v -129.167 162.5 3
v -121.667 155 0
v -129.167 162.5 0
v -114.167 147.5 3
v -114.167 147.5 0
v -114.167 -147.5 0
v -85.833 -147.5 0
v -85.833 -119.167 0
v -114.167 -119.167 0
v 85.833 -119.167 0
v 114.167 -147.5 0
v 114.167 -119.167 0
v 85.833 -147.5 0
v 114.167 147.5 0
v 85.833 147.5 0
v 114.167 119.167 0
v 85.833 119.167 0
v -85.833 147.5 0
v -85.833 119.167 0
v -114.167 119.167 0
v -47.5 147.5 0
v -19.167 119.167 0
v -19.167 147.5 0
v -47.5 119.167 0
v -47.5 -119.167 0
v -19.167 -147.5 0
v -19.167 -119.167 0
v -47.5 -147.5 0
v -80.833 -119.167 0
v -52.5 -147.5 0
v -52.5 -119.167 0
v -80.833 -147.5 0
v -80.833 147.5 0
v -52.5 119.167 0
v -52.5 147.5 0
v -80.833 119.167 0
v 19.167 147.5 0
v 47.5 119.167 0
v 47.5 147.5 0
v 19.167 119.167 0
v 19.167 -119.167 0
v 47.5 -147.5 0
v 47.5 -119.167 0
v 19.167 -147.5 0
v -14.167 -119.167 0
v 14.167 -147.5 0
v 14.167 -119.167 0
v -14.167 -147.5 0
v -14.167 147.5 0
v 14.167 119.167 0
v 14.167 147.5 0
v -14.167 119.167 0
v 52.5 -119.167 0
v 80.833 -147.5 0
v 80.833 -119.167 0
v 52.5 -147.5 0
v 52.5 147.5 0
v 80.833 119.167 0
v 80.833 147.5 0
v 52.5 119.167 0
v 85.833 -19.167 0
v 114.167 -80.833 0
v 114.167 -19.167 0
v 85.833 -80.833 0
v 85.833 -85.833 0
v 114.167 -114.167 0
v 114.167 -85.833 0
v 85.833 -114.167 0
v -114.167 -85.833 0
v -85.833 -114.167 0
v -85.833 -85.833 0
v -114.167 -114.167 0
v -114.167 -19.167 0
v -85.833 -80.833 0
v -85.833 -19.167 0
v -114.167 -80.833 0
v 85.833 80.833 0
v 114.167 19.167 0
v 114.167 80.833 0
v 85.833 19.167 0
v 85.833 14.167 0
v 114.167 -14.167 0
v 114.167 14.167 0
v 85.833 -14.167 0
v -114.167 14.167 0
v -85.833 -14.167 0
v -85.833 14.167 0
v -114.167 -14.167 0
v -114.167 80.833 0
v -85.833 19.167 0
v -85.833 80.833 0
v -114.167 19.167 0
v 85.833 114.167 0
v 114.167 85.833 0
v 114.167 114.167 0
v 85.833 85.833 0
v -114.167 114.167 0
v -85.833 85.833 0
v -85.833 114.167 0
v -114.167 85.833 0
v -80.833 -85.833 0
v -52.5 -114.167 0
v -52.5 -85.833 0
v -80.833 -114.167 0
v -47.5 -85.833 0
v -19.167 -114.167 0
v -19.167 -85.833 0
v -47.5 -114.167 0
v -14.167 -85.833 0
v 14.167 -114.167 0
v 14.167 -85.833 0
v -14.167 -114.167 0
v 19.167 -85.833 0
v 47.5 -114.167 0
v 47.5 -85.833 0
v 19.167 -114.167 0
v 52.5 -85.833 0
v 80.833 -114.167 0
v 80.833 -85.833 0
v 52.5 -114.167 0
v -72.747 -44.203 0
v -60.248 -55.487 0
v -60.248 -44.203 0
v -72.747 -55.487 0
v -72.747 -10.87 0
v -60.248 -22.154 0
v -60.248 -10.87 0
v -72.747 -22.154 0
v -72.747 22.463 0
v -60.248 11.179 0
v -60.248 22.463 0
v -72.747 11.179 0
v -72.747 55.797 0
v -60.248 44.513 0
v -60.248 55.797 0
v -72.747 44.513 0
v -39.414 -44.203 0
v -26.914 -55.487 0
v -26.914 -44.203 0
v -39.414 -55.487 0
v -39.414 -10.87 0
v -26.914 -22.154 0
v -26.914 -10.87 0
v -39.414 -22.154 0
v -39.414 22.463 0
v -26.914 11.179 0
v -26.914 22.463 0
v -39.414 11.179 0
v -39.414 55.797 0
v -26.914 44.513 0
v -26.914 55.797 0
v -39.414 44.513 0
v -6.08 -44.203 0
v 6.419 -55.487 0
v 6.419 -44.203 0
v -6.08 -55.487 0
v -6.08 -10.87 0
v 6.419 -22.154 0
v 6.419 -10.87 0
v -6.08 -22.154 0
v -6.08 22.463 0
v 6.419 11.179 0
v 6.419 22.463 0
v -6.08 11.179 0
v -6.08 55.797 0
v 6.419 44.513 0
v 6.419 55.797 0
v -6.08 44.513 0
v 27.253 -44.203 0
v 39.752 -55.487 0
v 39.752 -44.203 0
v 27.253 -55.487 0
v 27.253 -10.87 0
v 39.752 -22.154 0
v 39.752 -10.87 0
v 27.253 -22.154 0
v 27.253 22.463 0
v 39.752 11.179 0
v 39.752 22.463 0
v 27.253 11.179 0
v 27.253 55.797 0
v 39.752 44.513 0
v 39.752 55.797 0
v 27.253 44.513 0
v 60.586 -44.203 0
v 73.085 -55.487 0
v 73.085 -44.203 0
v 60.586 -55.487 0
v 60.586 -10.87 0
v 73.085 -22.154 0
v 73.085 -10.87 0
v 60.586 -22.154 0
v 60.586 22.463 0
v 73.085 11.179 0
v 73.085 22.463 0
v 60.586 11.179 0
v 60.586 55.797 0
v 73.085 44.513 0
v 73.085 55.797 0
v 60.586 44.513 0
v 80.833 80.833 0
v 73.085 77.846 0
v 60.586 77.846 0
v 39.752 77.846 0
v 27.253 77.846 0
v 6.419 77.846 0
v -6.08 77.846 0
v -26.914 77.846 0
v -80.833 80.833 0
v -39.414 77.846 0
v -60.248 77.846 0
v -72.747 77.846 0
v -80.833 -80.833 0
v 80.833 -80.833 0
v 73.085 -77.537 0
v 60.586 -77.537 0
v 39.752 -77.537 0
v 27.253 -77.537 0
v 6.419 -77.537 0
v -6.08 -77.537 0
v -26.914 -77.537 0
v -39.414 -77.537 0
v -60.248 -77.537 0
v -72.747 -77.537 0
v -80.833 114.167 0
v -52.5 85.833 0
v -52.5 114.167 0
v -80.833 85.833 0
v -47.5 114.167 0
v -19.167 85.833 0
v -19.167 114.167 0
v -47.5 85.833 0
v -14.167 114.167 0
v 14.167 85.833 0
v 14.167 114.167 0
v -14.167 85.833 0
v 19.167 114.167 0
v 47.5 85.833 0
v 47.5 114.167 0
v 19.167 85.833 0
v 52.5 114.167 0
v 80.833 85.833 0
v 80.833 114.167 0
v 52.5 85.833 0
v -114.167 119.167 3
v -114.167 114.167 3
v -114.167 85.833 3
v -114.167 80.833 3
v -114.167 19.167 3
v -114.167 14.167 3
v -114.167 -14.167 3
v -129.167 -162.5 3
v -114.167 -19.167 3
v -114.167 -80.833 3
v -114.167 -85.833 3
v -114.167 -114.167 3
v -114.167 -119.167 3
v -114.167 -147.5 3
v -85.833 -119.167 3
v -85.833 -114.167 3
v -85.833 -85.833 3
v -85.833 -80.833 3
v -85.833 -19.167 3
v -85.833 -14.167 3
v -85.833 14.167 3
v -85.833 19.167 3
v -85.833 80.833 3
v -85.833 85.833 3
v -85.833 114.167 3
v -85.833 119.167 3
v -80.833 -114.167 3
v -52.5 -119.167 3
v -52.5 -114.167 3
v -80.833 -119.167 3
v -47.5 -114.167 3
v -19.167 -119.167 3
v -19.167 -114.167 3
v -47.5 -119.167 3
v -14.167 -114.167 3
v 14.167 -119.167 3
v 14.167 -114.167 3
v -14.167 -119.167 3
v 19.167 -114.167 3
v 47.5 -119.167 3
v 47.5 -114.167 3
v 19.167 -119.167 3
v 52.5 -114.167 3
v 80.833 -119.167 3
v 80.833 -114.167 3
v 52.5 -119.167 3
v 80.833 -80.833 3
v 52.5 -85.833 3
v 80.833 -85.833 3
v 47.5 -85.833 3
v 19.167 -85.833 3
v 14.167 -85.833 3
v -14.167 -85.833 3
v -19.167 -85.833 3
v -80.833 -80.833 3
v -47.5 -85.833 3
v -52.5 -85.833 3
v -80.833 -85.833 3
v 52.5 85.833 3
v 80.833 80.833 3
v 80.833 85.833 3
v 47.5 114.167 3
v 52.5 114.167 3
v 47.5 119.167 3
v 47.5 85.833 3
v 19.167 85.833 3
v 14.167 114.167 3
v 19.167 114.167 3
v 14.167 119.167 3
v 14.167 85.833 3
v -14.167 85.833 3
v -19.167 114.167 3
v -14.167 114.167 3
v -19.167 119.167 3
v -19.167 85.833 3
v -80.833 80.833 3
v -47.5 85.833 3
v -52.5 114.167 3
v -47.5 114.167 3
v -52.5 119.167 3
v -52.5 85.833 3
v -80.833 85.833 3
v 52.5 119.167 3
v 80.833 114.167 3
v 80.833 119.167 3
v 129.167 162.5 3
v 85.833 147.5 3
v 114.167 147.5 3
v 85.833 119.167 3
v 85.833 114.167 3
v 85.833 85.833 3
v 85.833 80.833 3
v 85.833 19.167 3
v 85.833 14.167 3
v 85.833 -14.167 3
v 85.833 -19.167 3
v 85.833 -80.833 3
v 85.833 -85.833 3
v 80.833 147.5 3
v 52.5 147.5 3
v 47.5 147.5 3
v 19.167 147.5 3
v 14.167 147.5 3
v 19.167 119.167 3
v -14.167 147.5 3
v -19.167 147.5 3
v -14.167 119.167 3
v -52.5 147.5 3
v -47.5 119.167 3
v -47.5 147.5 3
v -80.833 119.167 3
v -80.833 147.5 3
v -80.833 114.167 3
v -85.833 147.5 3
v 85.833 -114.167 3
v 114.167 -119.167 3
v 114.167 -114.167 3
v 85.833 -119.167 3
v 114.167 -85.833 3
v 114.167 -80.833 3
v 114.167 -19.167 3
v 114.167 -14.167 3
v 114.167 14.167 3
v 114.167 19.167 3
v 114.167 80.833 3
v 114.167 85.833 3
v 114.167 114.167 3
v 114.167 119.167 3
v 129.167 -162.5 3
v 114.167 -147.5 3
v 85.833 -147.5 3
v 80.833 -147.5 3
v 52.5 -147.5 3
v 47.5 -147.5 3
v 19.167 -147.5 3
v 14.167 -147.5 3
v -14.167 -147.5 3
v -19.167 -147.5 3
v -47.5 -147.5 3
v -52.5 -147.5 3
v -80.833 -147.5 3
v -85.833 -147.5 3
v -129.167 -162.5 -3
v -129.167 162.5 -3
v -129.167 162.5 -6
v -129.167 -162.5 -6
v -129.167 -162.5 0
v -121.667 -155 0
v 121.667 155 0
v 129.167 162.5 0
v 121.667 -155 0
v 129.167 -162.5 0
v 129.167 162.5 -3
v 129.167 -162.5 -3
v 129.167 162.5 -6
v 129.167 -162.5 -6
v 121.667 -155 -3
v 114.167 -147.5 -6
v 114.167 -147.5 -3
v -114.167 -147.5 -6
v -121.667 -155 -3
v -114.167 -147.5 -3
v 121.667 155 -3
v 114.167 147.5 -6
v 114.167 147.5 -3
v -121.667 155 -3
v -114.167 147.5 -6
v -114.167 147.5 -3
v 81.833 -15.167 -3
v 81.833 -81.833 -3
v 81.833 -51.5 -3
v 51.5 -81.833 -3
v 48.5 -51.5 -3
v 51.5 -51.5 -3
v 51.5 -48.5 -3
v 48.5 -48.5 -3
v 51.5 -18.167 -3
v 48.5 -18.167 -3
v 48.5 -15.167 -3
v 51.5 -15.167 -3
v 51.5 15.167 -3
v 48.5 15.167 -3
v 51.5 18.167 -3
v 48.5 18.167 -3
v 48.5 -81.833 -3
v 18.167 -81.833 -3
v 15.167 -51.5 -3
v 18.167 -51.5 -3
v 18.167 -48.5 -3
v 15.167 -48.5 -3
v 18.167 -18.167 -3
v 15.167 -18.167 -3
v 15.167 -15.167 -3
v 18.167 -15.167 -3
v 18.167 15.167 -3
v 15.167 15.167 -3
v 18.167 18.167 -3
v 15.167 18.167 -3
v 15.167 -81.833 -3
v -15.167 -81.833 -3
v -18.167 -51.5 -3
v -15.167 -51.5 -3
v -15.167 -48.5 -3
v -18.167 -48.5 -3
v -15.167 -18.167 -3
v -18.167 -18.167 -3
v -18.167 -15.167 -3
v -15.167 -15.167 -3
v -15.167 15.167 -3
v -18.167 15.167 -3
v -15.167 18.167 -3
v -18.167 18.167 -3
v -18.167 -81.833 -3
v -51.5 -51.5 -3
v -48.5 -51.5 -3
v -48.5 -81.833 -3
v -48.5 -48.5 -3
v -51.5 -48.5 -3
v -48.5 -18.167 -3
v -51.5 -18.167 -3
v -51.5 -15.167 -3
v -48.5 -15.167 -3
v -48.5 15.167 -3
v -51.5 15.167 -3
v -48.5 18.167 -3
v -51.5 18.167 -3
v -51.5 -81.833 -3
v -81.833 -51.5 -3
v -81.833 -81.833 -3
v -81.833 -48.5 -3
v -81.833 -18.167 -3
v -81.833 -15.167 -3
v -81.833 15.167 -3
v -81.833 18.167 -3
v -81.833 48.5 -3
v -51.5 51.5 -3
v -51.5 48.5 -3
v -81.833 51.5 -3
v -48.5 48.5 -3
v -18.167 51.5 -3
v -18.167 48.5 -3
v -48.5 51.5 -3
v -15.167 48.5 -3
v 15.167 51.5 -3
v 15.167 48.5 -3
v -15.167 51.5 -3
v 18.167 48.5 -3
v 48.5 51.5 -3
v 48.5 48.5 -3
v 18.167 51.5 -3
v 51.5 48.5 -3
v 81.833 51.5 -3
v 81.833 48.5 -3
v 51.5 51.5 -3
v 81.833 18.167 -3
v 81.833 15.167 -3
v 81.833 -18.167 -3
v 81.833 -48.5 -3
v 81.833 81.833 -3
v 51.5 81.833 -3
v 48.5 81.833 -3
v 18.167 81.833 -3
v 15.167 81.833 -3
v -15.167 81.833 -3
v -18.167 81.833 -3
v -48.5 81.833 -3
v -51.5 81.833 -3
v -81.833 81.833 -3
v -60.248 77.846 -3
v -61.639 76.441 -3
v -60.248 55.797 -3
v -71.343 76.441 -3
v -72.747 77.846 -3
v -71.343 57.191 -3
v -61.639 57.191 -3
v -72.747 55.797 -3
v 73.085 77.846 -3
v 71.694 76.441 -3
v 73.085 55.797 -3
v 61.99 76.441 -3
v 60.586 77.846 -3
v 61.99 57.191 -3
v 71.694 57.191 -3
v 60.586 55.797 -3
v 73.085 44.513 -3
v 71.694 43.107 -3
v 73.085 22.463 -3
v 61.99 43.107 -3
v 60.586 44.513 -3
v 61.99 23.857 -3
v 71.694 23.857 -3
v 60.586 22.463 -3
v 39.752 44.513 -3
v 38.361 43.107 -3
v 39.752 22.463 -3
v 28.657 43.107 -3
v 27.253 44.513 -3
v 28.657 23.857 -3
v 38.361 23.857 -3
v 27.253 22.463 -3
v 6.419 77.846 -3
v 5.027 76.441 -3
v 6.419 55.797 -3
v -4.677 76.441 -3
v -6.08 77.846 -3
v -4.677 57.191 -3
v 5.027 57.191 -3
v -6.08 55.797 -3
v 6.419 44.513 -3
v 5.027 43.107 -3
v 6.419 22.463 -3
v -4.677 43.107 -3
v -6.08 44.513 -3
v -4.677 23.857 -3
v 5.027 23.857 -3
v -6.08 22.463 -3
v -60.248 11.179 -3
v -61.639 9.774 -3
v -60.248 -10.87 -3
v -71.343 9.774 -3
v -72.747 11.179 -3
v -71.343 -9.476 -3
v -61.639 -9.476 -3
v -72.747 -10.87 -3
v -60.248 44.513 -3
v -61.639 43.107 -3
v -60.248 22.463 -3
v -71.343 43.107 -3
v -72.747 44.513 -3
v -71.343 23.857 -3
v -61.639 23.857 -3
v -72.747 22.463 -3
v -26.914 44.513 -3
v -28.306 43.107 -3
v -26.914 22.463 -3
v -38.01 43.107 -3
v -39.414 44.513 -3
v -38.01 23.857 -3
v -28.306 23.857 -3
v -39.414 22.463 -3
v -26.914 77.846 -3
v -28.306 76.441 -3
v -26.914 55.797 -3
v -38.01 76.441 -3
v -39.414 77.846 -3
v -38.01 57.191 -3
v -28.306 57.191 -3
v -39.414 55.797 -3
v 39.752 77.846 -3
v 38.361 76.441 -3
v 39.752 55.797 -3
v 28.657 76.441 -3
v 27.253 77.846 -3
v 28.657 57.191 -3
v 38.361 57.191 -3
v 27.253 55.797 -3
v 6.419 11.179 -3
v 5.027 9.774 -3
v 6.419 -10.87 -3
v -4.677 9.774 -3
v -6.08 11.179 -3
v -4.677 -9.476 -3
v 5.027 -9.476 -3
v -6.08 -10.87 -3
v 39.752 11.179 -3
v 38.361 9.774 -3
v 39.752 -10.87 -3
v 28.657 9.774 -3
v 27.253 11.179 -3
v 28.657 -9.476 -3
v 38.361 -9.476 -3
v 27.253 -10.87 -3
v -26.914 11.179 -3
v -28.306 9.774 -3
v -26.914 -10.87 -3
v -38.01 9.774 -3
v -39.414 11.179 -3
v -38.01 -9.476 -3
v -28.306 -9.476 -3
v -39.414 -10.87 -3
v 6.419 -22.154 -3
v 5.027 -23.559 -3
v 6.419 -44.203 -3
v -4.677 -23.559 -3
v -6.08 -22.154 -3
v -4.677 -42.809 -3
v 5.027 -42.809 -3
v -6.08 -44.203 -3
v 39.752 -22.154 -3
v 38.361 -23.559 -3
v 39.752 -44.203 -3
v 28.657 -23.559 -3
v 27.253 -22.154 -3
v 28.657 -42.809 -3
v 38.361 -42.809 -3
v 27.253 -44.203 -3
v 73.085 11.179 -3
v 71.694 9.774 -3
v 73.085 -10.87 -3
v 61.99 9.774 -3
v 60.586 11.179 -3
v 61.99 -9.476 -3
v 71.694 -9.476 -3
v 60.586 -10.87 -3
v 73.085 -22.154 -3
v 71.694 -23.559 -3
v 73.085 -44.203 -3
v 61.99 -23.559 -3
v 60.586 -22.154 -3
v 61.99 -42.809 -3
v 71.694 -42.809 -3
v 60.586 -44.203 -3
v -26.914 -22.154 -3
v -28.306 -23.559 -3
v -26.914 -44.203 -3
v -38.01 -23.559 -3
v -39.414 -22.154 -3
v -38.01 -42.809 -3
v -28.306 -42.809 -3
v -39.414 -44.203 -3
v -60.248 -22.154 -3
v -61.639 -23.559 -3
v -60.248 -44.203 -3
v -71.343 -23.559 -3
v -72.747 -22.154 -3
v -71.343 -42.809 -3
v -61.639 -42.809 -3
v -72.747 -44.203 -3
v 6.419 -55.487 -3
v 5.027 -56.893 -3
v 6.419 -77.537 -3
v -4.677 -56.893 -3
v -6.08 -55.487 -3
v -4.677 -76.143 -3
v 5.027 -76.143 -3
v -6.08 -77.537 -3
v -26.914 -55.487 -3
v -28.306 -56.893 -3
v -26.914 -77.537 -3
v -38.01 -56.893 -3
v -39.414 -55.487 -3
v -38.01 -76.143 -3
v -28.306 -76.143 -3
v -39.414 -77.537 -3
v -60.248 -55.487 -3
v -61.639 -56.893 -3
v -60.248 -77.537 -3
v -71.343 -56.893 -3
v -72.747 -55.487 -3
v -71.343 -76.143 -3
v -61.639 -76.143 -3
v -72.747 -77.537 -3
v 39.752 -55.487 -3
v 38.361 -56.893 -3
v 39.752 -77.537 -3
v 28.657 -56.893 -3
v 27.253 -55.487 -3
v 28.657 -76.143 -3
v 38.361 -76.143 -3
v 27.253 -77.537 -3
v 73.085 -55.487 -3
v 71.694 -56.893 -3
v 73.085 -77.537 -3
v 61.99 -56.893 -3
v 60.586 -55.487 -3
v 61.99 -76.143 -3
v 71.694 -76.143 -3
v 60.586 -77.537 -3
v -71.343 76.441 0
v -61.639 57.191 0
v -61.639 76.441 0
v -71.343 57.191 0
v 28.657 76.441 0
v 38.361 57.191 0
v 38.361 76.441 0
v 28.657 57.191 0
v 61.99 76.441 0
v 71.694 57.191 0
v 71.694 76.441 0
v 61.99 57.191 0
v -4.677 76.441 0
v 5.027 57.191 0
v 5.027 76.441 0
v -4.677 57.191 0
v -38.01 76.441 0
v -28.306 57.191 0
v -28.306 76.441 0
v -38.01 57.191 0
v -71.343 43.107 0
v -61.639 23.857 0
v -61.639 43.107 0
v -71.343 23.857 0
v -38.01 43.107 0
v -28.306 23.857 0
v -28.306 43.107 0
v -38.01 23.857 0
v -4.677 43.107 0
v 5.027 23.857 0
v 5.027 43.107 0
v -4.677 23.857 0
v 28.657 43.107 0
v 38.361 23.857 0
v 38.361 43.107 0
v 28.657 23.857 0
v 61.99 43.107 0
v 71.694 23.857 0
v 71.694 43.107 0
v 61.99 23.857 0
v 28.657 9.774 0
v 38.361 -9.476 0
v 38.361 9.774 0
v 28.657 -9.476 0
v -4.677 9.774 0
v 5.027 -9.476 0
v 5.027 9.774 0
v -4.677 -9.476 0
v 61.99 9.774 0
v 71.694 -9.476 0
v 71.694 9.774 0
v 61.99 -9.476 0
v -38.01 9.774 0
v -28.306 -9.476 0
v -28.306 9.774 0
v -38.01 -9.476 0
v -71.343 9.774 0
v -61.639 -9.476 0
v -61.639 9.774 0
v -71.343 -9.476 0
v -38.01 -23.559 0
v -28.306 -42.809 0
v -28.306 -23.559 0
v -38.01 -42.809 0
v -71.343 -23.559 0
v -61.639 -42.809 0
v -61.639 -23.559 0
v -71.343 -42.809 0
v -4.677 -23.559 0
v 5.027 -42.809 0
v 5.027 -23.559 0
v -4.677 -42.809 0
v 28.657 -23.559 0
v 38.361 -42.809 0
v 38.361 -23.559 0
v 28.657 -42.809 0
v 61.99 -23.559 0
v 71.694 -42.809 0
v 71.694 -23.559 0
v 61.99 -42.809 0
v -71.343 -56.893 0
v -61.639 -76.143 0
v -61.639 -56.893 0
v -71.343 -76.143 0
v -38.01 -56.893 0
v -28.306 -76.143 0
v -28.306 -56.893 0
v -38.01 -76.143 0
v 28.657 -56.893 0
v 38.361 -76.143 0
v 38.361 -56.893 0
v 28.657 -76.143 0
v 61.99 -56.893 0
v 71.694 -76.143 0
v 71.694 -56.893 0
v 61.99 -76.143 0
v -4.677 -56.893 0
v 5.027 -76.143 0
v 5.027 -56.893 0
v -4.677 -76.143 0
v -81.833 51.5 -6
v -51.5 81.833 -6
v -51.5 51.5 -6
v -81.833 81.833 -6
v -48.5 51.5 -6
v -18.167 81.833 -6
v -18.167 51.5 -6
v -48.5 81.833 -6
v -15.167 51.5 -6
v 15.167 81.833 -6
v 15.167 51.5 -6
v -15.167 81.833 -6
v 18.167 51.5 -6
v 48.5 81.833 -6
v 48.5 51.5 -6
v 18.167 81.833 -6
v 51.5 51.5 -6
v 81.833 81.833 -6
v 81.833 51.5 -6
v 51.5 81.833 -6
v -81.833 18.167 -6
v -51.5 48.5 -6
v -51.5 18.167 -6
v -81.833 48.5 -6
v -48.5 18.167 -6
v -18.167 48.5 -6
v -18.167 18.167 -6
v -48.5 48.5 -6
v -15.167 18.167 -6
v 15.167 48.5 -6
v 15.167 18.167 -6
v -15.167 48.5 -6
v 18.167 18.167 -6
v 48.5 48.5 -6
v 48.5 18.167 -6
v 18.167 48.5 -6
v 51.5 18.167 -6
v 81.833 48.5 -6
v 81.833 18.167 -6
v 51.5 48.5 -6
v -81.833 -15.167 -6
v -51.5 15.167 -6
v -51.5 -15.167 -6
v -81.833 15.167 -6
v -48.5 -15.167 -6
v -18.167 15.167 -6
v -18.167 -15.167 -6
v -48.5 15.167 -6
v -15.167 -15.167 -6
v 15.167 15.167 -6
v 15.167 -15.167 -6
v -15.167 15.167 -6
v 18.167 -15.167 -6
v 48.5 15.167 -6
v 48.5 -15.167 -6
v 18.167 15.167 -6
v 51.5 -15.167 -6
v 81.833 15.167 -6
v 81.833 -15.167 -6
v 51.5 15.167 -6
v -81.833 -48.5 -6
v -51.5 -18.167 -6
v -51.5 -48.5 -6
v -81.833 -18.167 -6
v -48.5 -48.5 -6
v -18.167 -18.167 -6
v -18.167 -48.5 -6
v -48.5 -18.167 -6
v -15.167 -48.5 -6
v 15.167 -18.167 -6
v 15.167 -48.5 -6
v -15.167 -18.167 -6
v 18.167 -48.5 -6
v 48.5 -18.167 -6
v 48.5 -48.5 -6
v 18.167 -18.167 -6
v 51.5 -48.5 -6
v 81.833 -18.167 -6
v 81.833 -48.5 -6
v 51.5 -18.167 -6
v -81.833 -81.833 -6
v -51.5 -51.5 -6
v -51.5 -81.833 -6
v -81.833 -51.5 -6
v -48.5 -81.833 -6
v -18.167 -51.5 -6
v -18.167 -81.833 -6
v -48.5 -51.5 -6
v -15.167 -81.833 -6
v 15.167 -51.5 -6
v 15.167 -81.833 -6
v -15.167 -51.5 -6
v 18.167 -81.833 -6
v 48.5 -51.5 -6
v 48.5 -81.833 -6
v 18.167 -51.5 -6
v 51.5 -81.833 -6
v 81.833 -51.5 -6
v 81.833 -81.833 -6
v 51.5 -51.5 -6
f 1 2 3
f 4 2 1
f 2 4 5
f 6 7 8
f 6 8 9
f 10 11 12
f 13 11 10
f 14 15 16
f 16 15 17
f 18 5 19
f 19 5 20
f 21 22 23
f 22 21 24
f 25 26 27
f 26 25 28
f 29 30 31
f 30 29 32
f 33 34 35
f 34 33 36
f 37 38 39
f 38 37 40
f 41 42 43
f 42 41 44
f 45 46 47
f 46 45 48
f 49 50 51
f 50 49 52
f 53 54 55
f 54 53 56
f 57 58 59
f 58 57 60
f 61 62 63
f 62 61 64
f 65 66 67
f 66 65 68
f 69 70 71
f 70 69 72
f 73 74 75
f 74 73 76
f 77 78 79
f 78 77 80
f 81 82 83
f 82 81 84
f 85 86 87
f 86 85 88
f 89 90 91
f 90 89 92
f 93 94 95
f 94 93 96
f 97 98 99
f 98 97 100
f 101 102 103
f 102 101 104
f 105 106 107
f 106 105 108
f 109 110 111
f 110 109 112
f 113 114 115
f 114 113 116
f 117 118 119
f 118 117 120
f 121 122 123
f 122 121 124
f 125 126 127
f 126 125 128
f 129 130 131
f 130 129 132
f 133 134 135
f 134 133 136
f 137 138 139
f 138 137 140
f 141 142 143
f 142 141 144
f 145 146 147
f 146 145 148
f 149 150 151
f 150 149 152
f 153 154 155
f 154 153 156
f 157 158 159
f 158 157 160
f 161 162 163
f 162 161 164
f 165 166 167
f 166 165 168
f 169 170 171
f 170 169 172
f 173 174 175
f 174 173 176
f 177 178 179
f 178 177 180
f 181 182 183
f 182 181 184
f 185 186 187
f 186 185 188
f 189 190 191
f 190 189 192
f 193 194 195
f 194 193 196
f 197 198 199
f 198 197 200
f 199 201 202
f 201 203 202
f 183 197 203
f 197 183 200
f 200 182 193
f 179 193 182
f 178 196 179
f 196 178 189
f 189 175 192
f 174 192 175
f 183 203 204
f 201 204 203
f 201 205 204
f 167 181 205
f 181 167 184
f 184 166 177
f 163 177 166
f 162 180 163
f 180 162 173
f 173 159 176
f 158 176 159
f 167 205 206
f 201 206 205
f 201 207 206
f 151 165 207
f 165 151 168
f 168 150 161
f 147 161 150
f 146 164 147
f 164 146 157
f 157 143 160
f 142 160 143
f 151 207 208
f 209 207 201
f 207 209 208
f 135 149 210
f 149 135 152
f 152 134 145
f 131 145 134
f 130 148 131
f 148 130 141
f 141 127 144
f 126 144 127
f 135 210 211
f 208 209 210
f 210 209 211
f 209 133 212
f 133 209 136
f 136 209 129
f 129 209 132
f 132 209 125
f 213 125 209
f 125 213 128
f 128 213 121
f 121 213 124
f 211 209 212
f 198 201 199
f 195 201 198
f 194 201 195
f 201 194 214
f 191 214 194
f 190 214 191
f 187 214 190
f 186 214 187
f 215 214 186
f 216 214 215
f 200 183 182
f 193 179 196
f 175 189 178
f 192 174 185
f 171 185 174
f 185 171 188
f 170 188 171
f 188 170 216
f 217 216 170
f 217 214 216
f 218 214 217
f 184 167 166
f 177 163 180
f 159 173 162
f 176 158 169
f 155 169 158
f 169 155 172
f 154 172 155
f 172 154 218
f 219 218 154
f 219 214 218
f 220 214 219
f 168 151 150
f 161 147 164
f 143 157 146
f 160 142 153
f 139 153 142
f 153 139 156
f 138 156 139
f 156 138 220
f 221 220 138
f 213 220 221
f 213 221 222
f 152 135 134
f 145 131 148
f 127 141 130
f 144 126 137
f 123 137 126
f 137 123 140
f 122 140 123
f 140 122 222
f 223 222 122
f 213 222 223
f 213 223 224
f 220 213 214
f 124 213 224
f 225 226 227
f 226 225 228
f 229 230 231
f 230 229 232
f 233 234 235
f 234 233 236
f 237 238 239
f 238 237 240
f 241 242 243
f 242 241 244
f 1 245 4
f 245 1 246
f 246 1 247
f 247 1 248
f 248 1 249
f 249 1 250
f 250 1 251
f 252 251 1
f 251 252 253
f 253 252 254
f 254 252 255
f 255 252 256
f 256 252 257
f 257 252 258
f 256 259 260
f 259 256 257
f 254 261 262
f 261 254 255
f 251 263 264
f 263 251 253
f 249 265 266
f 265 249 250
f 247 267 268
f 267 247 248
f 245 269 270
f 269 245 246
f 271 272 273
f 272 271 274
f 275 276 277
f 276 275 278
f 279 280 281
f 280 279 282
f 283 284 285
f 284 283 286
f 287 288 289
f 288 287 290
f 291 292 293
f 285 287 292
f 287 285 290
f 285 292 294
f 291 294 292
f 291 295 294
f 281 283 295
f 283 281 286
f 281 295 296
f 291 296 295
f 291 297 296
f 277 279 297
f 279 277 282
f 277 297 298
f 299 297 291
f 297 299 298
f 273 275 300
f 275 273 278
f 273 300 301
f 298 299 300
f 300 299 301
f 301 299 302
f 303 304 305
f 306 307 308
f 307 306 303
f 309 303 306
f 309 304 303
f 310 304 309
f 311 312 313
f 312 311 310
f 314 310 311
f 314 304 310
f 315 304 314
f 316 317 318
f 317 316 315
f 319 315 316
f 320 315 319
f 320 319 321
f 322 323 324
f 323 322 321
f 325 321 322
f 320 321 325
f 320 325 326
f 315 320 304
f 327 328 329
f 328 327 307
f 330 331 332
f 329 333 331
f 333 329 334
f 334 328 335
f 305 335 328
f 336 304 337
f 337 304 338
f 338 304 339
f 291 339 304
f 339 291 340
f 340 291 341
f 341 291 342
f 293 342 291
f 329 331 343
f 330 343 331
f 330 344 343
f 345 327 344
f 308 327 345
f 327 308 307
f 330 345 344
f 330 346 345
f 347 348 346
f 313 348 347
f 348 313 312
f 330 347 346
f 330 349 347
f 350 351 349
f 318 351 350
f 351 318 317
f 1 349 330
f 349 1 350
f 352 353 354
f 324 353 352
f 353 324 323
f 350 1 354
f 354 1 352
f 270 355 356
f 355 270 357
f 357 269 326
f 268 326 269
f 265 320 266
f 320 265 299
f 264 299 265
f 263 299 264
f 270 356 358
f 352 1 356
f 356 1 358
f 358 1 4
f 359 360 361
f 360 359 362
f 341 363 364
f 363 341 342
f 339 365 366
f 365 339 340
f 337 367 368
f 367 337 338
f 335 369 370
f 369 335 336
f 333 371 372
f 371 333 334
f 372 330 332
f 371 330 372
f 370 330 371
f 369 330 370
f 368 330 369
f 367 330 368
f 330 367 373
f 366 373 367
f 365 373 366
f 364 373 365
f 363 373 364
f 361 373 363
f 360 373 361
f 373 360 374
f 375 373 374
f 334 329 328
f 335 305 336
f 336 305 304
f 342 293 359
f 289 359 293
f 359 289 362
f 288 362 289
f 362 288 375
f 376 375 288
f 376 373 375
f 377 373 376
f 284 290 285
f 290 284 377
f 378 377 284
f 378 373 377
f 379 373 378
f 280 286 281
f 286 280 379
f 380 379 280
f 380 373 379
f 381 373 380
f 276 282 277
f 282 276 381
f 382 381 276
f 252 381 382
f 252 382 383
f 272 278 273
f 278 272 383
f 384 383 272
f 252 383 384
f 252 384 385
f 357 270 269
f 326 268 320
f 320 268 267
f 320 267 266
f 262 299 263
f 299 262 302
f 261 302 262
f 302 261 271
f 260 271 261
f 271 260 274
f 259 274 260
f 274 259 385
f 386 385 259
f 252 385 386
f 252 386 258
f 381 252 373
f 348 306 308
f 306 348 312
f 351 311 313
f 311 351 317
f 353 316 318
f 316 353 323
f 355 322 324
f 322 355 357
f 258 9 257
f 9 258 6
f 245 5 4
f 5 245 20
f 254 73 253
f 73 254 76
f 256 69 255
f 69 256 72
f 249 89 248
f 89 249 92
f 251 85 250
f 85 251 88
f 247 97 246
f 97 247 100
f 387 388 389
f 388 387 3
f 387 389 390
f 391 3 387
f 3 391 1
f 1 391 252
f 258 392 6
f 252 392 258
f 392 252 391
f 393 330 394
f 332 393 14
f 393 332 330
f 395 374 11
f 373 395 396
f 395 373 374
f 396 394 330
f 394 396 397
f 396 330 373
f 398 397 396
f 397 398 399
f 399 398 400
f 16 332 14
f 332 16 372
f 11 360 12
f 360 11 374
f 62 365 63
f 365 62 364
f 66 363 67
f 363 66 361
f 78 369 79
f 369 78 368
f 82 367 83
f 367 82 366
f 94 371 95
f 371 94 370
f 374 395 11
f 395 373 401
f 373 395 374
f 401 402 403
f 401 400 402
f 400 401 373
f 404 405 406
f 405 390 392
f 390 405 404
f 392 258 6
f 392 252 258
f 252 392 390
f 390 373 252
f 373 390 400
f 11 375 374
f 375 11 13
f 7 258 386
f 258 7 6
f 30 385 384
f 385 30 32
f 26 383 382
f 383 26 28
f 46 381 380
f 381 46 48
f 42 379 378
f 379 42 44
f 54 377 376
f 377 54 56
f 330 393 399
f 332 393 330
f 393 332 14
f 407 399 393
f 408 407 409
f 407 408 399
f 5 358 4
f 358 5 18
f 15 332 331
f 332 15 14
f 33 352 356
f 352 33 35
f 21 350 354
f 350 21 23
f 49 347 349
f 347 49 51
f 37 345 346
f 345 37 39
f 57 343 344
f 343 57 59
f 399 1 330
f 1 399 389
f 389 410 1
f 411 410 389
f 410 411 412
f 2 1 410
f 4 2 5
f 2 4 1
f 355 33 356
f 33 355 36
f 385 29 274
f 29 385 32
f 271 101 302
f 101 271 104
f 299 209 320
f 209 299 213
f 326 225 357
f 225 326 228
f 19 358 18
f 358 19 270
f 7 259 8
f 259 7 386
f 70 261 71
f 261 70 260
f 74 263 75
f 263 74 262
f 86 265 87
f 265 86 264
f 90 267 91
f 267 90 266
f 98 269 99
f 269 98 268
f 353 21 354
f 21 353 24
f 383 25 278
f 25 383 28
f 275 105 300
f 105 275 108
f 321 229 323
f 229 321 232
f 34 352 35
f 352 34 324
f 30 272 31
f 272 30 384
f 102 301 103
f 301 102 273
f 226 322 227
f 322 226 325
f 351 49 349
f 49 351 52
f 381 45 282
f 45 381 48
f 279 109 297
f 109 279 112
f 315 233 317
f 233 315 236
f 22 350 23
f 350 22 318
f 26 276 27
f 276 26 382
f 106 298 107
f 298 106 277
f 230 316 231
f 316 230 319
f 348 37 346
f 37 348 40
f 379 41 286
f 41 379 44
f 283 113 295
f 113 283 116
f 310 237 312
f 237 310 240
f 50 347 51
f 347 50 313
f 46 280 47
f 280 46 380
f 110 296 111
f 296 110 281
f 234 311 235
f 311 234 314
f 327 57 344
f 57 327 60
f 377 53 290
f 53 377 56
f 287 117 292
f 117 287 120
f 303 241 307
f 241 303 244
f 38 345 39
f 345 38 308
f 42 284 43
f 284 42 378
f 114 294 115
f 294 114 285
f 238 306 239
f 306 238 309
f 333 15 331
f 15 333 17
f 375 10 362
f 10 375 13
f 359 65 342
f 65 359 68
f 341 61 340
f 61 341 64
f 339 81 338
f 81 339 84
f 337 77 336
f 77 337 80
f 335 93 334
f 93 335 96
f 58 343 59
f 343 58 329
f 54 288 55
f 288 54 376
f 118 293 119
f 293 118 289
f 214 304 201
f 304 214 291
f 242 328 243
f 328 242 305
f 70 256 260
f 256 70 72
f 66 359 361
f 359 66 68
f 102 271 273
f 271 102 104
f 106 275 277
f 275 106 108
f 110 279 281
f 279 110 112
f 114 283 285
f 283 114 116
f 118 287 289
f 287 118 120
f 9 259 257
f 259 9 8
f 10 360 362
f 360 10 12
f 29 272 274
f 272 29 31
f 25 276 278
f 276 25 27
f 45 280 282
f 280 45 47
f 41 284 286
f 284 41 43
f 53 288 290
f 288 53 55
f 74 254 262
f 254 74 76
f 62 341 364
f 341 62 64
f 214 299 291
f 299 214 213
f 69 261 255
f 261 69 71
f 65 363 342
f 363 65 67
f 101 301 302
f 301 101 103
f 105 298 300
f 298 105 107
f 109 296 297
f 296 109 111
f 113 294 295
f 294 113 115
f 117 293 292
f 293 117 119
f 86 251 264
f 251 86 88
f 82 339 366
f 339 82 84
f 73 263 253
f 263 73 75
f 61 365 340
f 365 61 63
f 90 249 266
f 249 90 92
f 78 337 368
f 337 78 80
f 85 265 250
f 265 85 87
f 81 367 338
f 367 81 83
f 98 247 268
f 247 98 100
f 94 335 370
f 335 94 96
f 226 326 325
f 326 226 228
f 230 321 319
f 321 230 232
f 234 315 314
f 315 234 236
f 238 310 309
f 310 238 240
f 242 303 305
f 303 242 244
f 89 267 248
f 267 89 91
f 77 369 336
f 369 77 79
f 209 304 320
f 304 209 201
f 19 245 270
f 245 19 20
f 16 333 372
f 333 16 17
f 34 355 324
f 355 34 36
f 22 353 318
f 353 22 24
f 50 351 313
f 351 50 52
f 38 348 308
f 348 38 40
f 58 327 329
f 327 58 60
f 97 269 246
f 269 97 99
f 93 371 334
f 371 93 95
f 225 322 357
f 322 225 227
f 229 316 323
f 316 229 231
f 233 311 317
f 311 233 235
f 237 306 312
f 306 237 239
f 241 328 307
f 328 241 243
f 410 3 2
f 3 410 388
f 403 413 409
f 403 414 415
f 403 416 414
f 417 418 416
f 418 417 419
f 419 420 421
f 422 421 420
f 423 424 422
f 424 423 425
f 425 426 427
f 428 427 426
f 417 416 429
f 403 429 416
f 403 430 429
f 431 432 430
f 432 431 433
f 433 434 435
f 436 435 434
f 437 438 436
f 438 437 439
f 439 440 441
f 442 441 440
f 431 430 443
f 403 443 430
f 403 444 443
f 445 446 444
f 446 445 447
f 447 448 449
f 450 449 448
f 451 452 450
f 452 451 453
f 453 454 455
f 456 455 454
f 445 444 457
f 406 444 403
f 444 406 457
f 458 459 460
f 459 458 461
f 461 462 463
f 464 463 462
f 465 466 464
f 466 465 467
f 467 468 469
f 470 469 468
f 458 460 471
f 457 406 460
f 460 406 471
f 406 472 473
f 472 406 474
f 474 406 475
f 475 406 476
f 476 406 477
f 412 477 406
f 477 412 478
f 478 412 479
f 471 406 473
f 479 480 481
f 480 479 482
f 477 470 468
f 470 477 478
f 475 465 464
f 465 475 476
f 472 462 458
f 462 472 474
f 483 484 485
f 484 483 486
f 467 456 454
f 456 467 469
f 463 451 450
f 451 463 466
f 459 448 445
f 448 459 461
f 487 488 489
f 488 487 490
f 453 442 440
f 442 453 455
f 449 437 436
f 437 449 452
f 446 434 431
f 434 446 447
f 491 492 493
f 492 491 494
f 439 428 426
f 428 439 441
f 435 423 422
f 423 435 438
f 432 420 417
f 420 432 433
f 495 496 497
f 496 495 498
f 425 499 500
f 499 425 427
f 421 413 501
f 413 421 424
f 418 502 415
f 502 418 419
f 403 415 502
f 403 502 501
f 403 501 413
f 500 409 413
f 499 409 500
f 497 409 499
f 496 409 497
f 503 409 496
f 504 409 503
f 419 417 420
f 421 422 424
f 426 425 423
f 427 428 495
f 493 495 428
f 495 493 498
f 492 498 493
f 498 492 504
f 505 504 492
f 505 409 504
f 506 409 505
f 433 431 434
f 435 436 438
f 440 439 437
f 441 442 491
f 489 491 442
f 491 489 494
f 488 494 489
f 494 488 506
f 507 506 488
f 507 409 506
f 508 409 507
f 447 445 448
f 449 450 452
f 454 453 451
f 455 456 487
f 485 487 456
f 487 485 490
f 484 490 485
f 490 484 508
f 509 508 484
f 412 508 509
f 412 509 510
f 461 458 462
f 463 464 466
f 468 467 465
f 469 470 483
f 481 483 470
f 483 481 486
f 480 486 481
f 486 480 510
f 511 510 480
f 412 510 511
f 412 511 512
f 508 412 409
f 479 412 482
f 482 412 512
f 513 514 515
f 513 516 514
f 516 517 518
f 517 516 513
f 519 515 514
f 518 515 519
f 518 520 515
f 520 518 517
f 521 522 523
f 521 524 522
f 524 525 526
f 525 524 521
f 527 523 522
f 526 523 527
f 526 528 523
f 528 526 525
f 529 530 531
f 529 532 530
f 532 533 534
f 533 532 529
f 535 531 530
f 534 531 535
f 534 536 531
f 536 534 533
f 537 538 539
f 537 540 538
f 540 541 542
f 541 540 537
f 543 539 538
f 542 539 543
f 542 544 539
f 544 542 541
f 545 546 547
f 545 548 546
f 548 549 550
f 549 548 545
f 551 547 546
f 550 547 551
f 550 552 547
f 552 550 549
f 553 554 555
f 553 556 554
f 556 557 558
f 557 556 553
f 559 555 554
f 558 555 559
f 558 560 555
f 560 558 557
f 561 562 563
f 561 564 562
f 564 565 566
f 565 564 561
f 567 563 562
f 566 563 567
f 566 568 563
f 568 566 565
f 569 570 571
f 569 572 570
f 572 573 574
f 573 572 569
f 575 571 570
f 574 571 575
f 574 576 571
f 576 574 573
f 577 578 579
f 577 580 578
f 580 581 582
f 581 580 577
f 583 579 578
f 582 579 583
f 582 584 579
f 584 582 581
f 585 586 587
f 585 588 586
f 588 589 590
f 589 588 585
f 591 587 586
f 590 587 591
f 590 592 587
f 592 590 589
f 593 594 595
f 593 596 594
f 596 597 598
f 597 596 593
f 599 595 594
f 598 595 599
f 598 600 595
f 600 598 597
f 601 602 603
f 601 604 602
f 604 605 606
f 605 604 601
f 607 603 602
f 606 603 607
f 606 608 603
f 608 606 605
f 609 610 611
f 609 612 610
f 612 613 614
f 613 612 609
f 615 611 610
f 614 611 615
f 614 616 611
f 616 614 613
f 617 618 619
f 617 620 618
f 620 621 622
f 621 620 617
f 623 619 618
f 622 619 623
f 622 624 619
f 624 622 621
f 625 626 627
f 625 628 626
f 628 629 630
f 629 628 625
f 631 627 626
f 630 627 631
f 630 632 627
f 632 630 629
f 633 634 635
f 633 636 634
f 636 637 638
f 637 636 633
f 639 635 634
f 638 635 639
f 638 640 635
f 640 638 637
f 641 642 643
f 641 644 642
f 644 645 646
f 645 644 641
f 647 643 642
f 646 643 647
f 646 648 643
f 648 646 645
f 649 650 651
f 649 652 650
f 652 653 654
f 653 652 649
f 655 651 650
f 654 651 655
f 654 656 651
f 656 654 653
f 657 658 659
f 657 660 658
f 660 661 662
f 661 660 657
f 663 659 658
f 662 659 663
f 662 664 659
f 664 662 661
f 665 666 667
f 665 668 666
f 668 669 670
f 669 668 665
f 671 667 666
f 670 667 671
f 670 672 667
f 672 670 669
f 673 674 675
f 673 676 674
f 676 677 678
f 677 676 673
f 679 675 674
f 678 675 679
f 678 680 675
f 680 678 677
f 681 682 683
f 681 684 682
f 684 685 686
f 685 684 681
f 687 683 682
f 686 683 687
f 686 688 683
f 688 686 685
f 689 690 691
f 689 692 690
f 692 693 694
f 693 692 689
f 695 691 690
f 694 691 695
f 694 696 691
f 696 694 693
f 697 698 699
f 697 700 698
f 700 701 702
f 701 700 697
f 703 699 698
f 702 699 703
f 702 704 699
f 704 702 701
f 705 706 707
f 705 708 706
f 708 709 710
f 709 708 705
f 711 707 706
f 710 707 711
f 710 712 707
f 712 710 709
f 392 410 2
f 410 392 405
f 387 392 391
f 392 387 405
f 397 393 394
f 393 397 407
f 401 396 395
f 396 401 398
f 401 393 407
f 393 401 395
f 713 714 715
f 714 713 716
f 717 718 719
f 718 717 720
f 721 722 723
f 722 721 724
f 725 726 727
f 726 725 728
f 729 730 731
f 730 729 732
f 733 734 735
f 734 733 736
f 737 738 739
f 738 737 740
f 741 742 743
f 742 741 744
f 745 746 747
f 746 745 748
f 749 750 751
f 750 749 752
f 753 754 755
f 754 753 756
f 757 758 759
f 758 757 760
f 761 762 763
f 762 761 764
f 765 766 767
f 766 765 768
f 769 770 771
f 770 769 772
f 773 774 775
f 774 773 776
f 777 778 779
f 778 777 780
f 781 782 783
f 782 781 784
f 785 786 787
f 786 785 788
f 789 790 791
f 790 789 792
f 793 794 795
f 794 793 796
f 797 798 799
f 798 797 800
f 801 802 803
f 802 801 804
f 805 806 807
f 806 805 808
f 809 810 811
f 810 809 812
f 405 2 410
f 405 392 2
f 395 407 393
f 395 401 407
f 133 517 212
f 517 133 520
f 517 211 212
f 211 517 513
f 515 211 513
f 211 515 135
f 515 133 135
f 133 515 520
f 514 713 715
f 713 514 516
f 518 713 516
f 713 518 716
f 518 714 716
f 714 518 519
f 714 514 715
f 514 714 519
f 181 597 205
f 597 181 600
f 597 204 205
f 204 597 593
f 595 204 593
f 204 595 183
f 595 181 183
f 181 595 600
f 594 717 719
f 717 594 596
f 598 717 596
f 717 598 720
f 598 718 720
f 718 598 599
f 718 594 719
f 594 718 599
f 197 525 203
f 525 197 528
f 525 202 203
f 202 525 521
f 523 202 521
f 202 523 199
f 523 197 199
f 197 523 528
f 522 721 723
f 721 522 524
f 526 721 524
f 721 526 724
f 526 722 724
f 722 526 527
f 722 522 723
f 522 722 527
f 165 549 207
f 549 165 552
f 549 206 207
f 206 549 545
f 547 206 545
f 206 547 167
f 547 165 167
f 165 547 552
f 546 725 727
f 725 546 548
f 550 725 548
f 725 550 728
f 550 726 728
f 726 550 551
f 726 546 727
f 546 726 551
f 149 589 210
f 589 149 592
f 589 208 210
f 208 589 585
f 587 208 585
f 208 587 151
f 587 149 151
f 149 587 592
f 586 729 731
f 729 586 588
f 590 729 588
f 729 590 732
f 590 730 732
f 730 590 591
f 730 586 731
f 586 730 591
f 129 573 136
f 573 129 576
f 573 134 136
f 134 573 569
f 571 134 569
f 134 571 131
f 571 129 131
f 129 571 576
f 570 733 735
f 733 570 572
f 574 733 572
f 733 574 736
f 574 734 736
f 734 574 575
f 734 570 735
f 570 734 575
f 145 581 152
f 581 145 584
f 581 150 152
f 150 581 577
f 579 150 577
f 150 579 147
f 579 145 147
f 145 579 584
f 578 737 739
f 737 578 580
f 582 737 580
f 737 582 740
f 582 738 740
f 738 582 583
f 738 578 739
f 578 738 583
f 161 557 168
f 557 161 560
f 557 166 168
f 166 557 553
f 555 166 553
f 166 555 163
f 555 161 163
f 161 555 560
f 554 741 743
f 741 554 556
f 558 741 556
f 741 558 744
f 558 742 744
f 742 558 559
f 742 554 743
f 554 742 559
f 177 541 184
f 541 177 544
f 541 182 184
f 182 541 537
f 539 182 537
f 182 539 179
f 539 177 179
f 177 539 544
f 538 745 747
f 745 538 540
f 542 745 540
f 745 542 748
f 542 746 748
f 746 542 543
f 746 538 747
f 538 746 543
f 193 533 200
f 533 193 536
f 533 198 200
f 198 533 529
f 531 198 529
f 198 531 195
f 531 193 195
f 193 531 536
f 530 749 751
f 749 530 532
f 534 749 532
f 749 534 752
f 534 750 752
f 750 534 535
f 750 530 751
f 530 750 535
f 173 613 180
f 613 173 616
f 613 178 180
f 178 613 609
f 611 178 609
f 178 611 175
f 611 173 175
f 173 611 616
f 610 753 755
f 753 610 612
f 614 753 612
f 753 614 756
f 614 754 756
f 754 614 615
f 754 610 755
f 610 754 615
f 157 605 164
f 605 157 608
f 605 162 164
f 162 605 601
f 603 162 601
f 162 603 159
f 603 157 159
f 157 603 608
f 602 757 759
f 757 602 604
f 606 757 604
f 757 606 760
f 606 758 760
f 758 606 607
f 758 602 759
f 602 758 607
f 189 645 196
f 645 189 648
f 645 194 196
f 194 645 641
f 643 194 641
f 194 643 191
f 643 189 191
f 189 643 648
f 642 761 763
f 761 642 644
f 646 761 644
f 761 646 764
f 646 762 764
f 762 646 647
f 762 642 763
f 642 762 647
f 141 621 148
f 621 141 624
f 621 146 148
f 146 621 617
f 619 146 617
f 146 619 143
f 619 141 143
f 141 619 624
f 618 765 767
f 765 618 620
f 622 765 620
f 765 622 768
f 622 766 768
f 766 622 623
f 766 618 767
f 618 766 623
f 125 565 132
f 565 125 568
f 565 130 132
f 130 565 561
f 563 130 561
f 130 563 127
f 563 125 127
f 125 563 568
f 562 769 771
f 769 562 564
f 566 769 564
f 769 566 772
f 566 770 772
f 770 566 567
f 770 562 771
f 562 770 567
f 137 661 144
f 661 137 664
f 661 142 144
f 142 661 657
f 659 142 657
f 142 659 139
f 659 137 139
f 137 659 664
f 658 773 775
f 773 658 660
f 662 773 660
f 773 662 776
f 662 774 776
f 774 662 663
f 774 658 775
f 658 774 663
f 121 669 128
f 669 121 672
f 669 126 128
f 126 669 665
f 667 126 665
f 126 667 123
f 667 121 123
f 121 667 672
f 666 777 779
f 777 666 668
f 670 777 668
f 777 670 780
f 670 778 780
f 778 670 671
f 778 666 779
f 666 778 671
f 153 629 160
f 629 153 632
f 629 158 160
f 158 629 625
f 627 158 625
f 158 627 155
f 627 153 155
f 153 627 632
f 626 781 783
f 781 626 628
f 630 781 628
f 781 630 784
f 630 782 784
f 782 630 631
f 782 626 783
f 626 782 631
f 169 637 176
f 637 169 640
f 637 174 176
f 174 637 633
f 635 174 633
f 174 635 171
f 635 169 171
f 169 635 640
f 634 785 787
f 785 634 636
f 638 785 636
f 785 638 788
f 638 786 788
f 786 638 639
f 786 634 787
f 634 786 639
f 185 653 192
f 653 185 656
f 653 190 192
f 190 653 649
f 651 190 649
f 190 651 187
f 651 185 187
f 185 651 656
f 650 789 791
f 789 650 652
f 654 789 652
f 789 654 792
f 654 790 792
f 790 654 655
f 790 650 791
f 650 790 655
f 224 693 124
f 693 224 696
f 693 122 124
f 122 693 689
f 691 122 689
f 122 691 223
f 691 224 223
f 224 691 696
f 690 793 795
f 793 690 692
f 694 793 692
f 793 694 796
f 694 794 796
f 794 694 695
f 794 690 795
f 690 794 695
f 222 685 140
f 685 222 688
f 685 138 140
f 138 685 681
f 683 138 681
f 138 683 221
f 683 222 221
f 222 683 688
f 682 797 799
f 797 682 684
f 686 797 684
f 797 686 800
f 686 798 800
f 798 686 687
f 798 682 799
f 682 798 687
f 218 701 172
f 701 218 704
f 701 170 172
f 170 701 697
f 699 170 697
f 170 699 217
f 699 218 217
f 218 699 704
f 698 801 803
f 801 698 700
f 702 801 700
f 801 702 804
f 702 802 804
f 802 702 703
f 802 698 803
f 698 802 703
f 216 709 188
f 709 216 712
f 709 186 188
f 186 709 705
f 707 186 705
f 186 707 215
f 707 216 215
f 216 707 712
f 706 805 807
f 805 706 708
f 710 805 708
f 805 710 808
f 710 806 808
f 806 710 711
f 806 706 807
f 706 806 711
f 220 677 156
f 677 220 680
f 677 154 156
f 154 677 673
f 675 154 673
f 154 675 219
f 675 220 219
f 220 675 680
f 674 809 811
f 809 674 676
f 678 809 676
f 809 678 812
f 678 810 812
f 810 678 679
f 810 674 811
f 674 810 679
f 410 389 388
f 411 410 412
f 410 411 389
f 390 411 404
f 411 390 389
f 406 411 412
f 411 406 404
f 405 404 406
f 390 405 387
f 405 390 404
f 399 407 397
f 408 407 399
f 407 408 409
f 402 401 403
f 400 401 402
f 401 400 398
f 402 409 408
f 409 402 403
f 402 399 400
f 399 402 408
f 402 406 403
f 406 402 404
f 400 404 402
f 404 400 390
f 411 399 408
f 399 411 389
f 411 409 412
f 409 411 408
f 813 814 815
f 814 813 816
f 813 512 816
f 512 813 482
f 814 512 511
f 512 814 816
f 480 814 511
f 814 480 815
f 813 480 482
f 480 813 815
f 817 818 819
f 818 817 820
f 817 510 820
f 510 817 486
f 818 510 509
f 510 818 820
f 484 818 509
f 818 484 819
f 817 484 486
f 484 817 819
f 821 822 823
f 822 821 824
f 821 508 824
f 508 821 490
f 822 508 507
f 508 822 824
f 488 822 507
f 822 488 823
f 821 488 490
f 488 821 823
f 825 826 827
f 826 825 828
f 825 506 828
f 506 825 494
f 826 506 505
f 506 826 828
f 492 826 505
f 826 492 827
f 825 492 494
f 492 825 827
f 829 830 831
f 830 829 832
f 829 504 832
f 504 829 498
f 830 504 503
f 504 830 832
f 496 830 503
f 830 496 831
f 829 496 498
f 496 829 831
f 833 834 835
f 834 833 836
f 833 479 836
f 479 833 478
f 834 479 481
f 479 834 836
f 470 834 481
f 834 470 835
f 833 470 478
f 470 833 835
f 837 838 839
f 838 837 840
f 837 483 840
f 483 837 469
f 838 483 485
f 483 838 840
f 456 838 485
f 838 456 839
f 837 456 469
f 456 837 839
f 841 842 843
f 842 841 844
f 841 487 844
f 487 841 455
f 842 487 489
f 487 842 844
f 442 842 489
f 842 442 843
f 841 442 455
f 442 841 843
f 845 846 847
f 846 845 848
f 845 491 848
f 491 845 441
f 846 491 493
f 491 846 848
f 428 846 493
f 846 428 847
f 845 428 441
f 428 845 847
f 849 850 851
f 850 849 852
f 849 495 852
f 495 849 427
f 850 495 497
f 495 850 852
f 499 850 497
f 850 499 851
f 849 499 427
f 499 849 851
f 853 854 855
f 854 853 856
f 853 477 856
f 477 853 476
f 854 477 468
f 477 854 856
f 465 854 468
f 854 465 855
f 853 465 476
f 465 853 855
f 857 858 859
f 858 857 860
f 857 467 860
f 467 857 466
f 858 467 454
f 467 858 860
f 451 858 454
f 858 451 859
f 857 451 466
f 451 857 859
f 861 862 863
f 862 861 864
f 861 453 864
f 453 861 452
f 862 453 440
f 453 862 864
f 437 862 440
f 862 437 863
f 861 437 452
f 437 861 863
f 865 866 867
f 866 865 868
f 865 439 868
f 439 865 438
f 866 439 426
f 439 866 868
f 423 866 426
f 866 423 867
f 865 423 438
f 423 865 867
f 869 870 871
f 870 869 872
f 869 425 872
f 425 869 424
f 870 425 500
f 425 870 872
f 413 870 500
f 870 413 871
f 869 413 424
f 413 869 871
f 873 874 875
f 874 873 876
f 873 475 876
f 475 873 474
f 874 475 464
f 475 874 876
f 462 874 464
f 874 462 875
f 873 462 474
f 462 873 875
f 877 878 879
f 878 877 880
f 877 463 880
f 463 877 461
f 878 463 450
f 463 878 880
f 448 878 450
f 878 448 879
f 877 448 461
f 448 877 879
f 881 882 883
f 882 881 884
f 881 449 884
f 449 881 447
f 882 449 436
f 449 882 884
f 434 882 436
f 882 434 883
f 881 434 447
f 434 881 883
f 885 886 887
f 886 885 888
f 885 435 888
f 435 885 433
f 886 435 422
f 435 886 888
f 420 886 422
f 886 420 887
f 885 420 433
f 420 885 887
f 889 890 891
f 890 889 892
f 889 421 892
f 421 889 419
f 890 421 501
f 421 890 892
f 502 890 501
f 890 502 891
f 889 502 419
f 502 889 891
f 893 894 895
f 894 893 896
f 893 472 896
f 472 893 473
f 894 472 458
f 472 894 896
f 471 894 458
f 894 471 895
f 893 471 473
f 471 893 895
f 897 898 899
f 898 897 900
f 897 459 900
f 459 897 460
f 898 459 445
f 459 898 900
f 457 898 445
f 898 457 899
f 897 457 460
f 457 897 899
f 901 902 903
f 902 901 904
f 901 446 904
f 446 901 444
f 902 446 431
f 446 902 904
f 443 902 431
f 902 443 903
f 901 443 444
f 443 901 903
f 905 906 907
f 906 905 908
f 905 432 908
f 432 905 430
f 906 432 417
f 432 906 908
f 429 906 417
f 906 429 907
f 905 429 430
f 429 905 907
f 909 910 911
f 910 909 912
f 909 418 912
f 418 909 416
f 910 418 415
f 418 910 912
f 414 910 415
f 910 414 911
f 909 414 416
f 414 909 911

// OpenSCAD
PLY_THICKNESS = 3;

GRID_SIZE = 1000 / 60 * 2;  // 2 LEDs per grid, 60 LEDS per metre
GRID_THICKNESS = 5;
GRID_COUNT_X = 7;
GRID_COUNT_Y = 9;

FRAME_WIDTH = 15;

INNER_WIDTH = GRID_COUNT_X * GRID_SIZE - GRID_THICKNESS;
INNER_HEIGHT = GRID_COUNT_Y * GRID_SIZE - GRID_THICKNESS;
OUTER_WIDTH = INNER_WIDTH + 2 * FRAME_WIDTH;
OUTER_HEIGHT = INNER_HEIGHT + 2 * FRAME_WIDTH;
echo(OUTER_WIDTH);
echo(OUTER_HEIGHT);

TEXTGRID = [
["열", "한", "다", "세", "네"],
["두", "여", "섯", "일", "곱"],
["여", "덟", "아", "홉", "시"],
["자", "정", "이", "삼", "십"],
["사", "오", "십", "오", "분"]
];
TEXTGRID_X = len(TEXTGRID);
TEXTGRID_Y = len(TEXTGRID[0]);

BAFFLE_HEIGHT = 3 * PLY_THICKNESS;


module frame_piece(length, width, half = false) {
  linear_extrude(PLY_THICKNESS) {
    difference() {
      // Main piece
      square([length, width], center = true);
      
      // Chamfer 1
      translate([-length/2, -width/2]) rotate(45) square(width * 2);
      
      // Chamfer 2
      translate([length/2, -width/2]) rotate(45) square(width * 2);
      
      // Half size
      if (half) {
        translate([0, width/2]) square([length, width], center = true);
      }
    }
  }
}

module frame(half = false) {
  trans_x = OUTER_WIDTH/2 - FRAME_WIDTH/2;
  trans_y = OUTER_HEIGHT/2 - FRAME_WIDTH/2;
  translate([-trans_x, 0, 0]) {
    rotate([0, 0, -90]) frame_piece(OUTER_HEIGHT, FRAME_WIDTH, half);
  }
  translate([trans_x, 0, 0]) {
    rotate([0, 0, 90]) frame_piece(OUTER_HEIGHT, FRAME_WIDTH, half);
  }
  translate([0, -trans_y, 0]) {
    rotate([0, 0, 0]) frame_piece(OUTER_WIDTH, FRAME_WIDTH, half);
  }
  translate([0, trans_y, 0]) {
    rotate([0, 0, 180]) frame_piece(OUTER_WIDTH, FRAME_WIDTH, half);
  }
}

module grid_vertical(pos) {
  translate([pos * GRID_SIZE, 0, PLY_THICKNESS / 2]) {
    cube([GRID_THICKNESS, INNER_HEIGHT, PLY_THICKNESS], center = true);
  }
}

module grid_horizontal(pos) {
  translate([0, pos * GRID_SIZE, PLY_THICKNESS / 2]) {
    cube([INNER_WIDTH, GRID_THICKNESS, PLY_THICKNESS], center = true);
  }
}

module grid() {
  difference() {
    // Grid
    union() {
      for (i = [-2.5, -1.5, -0.5, 0.5, 1.5, 2.5]) {
        grid_vertical(i);
      }
      for (i = [-3.5, -2.5, -0.5, 0.5, 2.5, 3.5]) {
        grid_horizontal(i);
      }
    }
    
    // Cutout for text grid
    cube([
      TEXTGRID_X * GRID_SIZE - GRID_THICKNESS, 
      TEXTGRID_Y * GRID_SIZE - GRID_THICKNESS, 
      PLY_THICKNESS * 3
    ], center = true);
  }
}

module textgrid_cell(s, x, y) {
  translate([
    (y - (TEXTGRID_Y - 1) / 2) * GRID_SIZE,
    (x - (TEXTGRID_X - 1) / 2) * -GRID_SIZE,
    0
  ]) {
    text(
      s, 
      size = 18,
      font = "Noto Serif KR:style=Bold", 
      halign = "center", 
      valign = "center"
    );
  }
}

module textgrid() {
  for (i = [0 : TEXTGRID_X - 1]) {
    for (j = [0 : TEXTGRID_Y - 1]) {
      textgrid_cell(TEXTGRID[i][j], i, j);
    }
  }
}

module diffuser_cell(x, y) {
  translate([
    (y - (TEXTGRID_Y - 1) / 2) * GRID_SIZE,
    (x - (TEXTGRID_X - 1) / 2) * -GRID_SIZE,
    0
  ]) {
    square([GRID_SIZE - PLY_THICKNESS, GRID_SIZE - PLY_THICKNESS], center = true);
  }
}

module baffle(length) {
  difference() {
    square([length, BAFFLE_HEIGHT], center = true);
  }
}

module baffle_vertical(pos) {
  
}

module layer1() {
  color([0.5, 0, 0]) frame();
  color([0.4, 0.2, 0]) grid();
}

module layer2() {
  color([0.6, 0.2, 0.2]) frame(half = true);
  color([1, 0.8, 0.5]) linear_extrude(PLY_THICKNESS) difference() {
    square([INNER_WIDTH + FRAME_WIDTH, INNER_HEIGHT + FRAME_WIDTH], center = true);
    textgrid();
  }
}

module layer3() {
  color([0.7, 0.4, 0.4]) frame();
  color([0.9, 0.9, 0.9]) for (i = [0 : TEXTGRID_X - 1]) {
    for (j = [0 : TEXTGRID_Y - 1]) {
      linear_extrude(PLY_THICKNESS) diffuser_cell(i, j);
    }
  }
}

translate([0, 0, PLY_THICKNESS *  0]) layer1();
translate([0, 0, PLY_THICKNESS * -1]) layer2();
translate([0, 0, PLY_THICKNESS * -2]) layer3();
